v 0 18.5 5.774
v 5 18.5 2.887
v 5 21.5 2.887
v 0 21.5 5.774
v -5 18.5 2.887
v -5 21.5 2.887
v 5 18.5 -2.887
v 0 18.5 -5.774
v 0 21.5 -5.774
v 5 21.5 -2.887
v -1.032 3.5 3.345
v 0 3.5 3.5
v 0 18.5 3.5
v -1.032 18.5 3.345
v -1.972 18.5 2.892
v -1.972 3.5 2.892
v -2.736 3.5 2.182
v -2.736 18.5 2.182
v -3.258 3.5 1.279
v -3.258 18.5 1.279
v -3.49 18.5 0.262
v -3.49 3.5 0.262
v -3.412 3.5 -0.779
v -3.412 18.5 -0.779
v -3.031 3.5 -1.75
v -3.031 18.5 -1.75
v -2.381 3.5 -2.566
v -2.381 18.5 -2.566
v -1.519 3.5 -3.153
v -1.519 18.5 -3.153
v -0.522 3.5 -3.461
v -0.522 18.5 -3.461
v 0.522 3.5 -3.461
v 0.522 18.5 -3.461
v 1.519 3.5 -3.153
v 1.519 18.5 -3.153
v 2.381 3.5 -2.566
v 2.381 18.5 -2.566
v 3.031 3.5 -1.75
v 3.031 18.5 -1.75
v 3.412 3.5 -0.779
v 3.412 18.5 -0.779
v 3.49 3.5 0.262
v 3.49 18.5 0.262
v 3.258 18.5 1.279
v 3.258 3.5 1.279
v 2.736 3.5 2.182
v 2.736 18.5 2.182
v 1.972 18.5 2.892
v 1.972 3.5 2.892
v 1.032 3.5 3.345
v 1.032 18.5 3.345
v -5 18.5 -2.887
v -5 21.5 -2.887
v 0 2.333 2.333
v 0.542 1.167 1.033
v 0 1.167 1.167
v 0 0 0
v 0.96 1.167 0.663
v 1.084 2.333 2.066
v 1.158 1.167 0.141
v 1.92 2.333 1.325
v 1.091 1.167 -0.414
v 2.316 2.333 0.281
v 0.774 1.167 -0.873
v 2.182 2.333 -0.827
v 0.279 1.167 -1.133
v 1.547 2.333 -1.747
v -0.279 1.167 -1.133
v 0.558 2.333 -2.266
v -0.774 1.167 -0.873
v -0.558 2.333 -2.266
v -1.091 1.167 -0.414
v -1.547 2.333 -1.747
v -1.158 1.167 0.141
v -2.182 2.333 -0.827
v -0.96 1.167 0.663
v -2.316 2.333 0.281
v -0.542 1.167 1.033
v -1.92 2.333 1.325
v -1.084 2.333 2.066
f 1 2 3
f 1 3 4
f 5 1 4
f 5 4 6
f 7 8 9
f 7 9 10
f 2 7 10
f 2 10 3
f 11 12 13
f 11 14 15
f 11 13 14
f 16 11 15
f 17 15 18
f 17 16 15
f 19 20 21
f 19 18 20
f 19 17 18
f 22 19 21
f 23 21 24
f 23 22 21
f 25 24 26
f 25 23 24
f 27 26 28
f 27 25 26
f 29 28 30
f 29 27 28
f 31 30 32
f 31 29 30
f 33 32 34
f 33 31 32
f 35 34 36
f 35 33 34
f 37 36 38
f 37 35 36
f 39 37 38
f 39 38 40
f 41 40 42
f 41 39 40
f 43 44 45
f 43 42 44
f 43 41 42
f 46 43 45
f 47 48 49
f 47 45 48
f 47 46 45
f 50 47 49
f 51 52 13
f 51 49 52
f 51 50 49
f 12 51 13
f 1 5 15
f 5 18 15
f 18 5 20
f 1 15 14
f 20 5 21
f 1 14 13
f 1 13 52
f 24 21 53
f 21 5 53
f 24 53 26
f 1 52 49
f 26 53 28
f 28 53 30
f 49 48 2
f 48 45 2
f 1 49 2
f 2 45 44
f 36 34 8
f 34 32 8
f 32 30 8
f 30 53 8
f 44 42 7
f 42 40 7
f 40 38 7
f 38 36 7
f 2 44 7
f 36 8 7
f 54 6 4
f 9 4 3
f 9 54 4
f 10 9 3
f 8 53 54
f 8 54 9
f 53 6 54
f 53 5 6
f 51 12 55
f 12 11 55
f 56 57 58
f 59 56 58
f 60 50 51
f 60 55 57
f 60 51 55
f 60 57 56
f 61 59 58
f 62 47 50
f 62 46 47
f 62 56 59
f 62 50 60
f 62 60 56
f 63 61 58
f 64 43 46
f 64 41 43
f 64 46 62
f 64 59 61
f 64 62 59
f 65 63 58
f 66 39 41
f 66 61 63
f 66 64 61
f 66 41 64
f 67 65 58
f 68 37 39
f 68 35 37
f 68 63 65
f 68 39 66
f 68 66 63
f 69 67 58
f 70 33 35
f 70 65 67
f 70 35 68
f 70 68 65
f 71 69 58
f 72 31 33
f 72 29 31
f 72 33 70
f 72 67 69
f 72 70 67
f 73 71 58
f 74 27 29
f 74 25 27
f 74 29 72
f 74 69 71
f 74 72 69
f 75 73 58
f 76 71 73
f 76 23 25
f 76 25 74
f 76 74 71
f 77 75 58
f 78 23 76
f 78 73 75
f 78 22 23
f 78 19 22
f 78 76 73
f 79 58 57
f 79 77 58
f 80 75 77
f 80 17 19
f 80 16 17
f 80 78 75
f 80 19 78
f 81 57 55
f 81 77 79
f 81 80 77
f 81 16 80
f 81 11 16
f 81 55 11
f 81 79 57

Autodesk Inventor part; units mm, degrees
ref_plane "YZ Plane" through (0, 0, 0) normal (1, 0, 0) x (0, 1, 0)
ref_plane "XZ Plane" through (0, 0, 0) normal (0, 1, 0) x (-1, 0, 0)
ref_plane "XY Plane" through (0, 0, 0) normal (0, 0, 1) x (1, 0, 0)
sketch "Sketch1" plane through (0, 0, 0) normal (1, 0, 0) x (0, 1, 0)
  line L0 (0, 0) -> (18.5, 0)
  line L1 (18.5, 0) -> (18.5, 3.5)
  line L2 (18.5, 3.5) -> (3.5, 3.5)
  line L3 (3.5, 3.5) -> (0, 0)
  dimension "d0" = 135
  dimension "d1" = 3.5
  dimension "d2" = 18.5
revolve "Revolution1" add sketch "Sketch1" angle 360 about axis through (0, 0, 0) along (0, 1, 0)
thread "Thread1" size "M7x1" class "6g" standard "ANSI Metric M Profile" full length
sketch "Sketch2" plane through (0, 18.5, 0) normal (0, 1, 0) x (1, 0, 0)
  circle A0 centre (0, 0) radius 5 construction
  line L0 (-5, -2.8868) -> (-5, 2.8868)
  line L1 (-5, 2.8868) -> (0, 5.7735)
  line L2 (0, 5.7735) -> (5, 2.8868)
  line L3 (5, 2.8868) -> (5, -2.8868)
  line L4 (5, -2.8868) -> (0, -5.7735)
  line L5 (0, -5.7735) -> (-5, -2.8868)
  dimension "d6" = 10
  dimension "d7" = 120
extrude "Extrusion1" add sketch "Sketch2" along normal blind 3
properties part number "side bolt"
